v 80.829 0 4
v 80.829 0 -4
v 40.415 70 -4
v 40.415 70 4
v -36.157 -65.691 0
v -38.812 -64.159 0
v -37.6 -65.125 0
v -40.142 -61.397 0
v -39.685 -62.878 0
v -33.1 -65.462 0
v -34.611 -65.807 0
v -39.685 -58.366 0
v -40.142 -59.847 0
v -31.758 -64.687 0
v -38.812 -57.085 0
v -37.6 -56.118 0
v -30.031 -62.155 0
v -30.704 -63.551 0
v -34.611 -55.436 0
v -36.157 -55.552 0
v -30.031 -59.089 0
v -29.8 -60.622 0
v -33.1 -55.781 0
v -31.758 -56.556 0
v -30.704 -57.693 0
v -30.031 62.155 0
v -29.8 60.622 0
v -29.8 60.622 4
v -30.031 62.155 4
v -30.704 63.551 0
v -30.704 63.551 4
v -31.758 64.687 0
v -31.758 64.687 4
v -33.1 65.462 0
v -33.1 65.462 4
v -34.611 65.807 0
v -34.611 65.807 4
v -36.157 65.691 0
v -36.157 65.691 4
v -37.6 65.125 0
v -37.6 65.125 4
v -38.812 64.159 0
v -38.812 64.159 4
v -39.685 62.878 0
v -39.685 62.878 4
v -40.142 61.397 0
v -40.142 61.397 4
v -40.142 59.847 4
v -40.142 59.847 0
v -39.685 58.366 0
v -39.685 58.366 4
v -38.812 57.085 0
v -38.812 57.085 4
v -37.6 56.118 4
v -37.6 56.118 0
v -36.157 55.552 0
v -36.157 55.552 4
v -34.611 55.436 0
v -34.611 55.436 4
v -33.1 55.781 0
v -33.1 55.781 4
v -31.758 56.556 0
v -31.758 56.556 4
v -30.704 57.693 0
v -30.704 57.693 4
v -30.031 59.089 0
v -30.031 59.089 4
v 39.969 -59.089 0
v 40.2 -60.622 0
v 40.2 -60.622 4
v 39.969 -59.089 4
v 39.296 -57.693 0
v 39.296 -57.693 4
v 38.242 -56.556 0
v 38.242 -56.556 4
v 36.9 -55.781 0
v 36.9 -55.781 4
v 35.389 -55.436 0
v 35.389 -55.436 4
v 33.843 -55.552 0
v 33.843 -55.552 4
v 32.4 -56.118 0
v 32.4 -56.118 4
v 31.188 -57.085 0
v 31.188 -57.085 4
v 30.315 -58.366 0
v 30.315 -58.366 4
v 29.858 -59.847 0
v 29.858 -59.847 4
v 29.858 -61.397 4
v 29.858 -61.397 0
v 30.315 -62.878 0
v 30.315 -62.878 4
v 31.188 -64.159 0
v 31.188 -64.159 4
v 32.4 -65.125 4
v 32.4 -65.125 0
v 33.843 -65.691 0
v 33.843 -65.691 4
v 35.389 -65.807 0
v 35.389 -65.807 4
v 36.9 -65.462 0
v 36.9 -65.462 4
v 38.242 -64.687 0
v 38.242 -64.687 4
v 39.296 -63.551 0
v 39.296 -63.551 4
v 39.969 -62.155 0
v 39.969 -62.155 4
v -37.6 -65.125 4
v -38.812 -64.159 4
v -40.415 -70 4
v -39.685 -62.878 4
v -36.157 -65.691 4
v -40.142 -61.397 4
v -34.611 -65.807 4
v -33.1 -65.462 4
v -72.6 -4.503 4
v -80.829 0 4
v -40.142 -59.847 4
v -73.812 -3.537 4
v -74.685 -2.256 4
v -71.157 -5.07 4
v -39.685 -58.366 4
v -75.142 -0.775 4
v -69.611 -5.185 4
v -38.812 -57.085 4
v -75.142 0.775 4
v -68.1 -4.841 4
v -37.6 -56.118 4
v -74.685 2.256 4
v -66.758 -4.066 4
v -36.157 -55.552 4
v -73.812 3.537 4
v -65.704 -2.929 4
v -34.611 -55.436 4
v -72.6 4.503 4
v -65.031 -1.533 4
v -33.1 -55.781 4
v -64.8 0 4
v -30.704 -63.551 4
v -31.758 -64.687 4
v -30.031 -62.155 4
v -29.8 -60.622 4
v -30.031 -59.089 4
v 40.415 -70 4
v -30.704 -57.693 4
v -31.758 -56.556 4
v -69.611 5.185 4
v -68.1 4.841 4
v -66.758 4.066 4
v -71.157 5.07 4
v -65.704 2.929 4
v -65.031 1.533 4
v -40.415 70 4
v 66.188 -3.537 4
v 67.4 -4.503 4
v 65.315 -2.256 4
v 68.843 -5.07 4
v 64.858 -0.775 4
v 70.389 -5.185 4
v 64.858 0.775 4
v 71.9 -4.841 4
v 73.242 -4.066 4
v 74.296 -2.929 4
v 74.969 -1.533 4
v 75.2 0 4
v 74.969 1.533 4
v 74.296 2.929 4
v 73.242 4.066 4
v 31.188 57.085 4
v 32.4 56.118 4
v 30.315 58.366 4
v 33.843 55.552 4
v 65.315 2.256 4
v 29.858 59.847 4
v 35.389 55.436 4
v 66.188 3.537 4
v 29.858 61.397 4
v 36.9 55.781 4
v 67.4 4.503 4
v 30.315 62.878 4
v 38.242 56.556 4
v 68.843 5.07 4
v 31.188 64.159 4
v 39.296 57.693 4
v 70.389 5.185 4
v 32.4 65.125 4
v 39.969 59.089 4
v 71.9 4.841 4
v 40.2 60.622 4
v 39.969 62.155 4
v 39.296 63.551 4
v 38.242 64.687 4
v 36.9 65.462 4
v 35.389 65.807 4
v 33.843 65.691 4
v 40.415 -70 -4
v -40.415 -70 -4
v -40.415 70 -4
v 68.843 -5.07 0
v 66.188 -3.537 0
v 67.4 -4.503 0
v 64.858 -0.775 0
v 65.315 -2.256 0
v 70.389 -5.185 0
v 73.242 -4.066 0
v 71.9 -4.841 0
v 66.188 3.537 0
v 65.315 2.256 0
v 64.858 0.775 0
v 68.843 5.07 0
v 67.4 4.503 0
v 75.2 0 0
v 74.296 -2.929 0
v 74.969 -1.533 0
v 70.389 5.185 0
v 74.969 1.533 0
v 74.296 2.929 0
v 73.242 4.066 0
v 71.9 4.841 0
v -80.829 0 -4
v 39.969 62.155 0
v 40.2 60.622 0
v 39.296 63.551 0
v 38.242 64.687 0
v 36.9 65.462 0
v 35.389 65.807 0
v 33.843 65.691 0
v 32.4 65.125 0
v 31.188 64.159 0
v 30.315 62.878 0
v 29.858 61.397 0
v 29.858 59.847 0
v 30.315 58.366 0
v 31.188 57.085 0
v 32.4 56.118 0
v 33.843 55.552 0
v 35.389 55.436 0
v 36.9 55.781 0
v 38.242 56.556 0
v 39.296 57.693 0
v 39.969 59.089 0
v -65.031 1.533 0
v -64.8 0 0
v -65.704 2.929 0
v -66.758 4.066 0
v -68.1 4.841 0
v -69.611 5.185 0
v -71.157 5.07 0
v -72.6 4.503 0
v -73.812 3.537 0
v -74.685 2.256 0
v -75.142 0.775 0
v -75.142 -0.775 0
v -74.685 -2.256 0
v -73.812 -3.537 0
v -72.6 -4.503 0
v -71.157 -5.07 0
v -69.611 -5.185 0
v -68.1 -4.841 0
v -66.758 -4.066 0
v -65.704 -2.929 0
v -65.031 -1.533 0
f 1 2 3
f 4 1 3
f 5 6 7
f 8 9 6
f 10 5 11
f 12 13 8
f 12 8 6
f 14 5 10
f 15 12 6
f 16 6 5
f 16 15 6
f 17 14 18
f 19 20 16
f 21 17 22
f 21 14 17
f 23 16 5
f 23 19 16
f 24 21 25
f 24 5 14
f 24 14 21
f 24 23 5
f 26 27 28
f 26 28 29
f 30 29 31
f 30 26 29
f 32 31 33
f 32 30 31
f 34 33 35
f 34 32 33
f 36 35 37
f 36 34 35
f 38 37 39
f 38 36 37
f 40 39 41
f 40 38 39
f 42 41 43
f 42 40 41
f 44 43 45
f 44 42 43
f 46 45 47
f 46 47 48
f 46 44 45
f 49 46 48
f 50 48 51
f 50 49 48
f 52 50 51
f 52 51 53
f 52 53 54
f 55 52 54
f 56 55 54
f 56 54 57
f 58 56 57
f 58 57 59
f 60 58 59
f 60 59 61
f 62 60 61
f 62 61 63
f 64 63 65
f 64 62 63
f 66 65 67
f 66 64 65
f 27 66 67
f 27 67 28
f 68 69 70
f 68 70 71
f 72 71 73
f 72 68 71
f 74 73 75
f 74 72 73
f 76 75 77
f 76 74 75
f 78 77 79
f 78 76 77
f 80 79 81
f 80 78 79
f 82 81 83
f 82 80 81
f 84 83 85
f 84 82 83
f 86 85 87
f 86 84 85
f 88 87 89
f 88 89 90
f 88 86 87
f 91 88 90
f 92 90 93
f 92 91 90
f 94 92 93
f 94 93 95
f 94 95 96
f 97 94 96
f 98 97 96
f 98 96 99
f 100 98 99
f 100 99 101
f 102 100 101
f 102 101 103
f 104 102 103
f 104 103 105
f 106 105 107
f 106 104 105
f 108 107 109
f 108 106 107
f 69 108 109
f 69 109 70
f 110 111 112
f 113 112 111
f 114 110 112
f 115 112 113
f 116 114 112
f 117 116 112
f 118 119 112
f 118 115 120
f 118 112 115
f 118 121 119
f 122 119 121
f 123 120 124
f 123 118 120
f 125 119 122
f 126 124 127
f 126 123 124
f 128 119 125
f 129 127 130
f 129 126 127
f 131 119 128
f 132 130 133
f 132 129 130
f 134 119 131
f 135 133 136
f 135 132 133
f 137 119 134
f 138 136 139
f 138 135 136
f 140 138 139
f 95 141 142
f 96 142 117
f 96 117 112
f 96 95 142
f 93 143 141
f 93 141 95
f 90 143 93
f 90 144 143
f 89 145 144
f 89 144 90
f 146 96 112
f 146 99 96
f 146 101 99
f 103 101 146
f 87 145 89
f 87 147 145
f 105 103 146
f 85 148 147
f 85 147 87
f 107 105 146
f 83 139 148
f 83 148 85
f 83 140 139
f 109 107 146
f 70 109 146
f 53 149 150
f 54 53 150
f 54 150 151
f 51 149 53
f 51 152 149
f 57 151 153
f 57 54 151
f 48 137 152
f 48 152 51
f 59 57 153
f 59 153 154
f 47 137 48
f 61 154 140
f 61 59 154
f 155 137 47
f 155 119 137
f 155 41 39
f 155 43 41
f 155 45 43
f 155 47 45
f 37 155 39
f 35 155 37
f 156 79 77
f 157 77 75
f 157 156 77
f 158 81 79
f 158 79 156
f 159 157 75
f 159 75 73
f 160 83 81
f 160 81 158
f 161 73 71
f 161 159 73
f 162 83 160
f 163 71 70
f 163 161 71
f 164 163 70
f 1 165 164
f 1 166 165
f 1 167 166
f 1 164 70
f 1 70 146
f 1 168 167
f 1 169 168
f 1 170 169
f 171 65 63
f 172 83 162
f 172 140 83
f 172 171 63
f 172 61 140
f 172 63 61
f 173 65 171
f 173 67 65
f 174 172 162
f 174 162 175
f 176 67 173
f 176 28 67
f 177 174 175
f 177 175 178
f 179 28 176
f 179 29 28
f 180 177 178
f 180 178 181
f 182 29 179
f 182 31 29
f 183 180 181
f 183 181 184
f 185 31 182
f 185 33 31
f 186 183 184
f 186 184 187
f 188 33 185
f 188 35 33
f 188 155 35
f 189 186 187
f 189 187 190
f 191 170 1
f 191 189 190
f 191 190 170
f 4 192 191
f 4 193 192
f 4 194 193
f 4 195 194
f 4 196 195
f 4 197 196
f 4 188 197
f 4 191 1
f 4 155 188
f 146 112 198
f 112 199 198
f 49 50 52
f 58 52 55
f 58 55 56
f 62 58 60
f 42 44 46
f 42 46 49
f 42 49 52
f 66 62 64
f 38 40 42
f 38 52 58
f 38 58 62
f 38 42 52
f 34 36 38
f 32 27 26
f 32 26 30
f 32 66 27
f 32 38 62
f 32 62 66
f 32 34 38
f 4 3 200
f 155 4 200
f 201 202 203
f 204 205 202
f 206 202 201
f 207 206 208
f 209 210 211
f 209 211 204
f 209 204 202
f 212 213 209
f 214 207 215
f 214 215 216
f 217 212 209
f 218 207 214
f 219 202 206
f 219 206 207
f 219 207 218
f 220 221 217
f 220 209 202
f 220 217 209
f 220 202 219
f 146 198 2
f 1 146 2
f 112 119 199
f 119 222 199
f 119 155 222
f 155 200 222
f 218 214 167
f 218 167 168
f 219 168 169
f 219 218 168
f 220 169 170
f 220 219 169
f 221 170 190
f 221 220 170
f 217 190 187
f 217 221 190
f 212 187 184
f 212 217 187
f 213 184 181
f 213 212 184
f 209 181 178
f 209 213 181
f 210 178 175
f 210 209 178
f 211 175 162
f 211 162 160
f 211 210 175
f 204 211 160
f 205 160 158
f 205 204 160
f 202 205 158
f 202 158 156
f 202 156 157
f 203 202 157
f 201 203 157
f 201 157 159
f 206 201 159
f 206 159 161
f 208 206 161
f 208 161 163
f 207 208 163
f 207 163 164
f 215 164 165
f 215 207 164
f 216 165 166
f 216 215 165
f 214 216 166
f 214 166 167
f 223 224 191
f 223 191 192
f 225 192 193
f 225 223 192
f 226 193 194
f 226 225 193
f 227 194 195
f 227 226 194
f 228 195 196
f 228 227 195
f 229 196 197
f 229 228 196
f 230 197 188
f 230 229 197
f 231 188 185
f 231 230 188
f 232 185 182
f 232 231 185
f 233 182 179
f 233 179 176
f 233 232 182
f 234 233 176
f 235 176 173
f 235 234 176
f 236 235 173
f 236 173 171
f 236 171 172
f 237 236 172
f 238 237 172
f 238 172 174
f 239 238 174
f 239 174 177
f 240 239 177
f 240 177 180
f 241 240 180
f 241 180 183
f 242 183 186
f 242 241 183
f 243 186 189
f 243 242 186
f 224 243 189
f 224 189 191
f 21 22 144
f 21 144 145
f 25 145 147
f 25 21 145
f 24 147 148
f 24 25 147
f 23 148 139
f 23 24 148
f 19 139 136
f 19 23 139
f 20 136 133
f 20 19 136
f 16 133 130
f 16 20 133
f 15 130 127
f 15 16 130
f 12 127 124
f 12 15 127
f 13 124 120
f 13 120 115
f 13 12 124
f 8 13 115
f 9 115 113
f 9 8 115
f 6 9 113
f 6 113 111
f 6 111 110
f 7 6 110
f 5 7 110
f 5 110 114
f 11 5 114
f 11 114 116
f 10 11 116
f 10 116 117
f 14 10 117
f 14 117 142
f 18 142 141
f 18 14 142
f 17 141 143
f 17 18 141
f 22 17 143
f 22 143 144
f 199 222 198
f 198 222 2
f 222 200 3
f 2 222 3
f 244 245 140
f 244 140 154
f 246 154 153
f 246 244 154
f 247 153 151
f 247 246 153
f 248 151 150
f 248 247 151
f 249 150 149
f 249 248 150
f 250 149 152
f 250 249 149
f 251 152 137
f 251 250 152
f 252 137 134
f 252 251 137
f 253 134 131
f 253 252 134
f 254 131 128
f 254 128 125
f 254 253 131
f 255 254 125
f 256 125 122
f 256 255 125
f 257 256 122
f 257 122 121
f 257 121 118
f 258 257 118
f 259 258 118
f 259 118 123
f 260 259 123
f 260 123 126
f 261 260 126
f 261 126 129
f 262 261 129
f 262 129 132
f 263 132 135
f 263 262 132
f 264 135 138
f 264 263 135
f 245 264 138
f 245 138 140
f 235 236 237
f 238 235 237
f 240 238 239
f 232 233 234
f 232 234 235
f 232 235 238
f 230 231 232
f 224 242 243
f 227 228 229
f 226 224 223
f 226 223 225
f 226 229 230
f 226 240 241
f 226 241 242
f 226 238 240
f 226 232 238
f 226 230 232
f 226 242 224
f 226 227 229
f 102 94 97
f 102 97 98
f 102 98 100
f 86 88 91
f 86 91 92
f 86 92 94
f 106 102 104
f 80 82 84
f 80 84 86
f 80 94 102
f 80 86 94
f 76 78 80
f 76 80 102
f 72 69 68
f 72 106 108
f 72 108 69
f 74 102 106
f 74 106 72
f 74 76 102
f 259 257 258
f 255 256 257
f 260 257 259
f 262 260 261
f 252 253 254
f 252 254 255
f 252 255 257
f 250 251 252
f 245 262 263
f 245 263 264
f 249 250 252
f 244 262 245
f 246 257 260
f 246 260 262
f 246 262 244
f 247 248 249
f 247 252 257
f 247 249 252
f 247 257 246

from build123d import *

# Parameters (mm, degrees)
F0_R     = 5.2
F1_DEPTH = 4
F2_DEPTH = 4


with BuildPart() as f1:
    # F0 (on Top) → F1 (new body)
    with BuildSketch(Plane.XY):
        Polygon((40.4145188433, 70), (-40.4145188433, 70), (-80.8290376865, 0), (-40.4145188433, -70), (40.4145188433, -70), (80.8290376865, 0), align=None)
        with Locations((-35, -60.6217782649)):
            Circle(F0_R, mode=Mode.SUBTRACT)
        with Locations((35, -60.6217782649)):
            Circle(F0_R, mode=Mode.SUBTRACT)
        with Locations((-70, 0)):
            Circle(F0_R, mode=Mode.SUBTRACT)
        with Locations((-35, 60.6217782649)):
            Circle(F0_R, mode=Mode.SUBTRACT)
        with Locations((70, 0)):
            Circle(F0_R, mode=Mode.SUBTRACT)
        with Locations((35, 60.6217782649)):
            Circle(F0_R, mode=Mode.SUBTRACT)
        with Locations((-70, 0)):
            Circle(F0_R)
        with Locations((-35, 60.6217782649)):
            Circle(F0_R)
        with Locations((35, 60.6217782649)):
            Circle(F0_R)
        with Locations((70, 0)):
            Circle(F0_R)
        with Locations((35, -60.6217782649)):
            Circle(F0_R)
        with Locations((-35, -60.6217782649)):
            Circle(F0_R)
    extrude(amount=-F1_DEPTH)

    # F0 (on Top) → F2 (join)
    with BuildSketch(Plane.XY):
        Polygon((40.4145188433, 70), (-40.4145188433, 70), (-80.8290376865, 0), (-40.4145188433, -70), (40.4145188433, -70), (80.8290376865, 0), align=None)
        with Locations((-35, -60.6217782649)):
            Circle(F0_R, mode=Mode.SUBTRACT)
        with Locations((35, -60.6217782649)):
            Circle(F0_R, mode=Mode.SUBTRACT)
        with Locations((-70, 0)):
            Circle(F0_R, mode=Mode.SUBTRACT)
        with Locations((-35, 60.6217782649)):
            Circle(F0_R, mode=Mode.SUBTRACT)
        with Locations((70, 0)):
            Circle(F0_R, mode=Mode.SUBTRACT)
        with Locations((35, 60.6217782649)):
            Circle(F0_R, mode=Mode.SUBTRACT)
    extrude(amount=F2_DEPTH)


solid = f1.part
